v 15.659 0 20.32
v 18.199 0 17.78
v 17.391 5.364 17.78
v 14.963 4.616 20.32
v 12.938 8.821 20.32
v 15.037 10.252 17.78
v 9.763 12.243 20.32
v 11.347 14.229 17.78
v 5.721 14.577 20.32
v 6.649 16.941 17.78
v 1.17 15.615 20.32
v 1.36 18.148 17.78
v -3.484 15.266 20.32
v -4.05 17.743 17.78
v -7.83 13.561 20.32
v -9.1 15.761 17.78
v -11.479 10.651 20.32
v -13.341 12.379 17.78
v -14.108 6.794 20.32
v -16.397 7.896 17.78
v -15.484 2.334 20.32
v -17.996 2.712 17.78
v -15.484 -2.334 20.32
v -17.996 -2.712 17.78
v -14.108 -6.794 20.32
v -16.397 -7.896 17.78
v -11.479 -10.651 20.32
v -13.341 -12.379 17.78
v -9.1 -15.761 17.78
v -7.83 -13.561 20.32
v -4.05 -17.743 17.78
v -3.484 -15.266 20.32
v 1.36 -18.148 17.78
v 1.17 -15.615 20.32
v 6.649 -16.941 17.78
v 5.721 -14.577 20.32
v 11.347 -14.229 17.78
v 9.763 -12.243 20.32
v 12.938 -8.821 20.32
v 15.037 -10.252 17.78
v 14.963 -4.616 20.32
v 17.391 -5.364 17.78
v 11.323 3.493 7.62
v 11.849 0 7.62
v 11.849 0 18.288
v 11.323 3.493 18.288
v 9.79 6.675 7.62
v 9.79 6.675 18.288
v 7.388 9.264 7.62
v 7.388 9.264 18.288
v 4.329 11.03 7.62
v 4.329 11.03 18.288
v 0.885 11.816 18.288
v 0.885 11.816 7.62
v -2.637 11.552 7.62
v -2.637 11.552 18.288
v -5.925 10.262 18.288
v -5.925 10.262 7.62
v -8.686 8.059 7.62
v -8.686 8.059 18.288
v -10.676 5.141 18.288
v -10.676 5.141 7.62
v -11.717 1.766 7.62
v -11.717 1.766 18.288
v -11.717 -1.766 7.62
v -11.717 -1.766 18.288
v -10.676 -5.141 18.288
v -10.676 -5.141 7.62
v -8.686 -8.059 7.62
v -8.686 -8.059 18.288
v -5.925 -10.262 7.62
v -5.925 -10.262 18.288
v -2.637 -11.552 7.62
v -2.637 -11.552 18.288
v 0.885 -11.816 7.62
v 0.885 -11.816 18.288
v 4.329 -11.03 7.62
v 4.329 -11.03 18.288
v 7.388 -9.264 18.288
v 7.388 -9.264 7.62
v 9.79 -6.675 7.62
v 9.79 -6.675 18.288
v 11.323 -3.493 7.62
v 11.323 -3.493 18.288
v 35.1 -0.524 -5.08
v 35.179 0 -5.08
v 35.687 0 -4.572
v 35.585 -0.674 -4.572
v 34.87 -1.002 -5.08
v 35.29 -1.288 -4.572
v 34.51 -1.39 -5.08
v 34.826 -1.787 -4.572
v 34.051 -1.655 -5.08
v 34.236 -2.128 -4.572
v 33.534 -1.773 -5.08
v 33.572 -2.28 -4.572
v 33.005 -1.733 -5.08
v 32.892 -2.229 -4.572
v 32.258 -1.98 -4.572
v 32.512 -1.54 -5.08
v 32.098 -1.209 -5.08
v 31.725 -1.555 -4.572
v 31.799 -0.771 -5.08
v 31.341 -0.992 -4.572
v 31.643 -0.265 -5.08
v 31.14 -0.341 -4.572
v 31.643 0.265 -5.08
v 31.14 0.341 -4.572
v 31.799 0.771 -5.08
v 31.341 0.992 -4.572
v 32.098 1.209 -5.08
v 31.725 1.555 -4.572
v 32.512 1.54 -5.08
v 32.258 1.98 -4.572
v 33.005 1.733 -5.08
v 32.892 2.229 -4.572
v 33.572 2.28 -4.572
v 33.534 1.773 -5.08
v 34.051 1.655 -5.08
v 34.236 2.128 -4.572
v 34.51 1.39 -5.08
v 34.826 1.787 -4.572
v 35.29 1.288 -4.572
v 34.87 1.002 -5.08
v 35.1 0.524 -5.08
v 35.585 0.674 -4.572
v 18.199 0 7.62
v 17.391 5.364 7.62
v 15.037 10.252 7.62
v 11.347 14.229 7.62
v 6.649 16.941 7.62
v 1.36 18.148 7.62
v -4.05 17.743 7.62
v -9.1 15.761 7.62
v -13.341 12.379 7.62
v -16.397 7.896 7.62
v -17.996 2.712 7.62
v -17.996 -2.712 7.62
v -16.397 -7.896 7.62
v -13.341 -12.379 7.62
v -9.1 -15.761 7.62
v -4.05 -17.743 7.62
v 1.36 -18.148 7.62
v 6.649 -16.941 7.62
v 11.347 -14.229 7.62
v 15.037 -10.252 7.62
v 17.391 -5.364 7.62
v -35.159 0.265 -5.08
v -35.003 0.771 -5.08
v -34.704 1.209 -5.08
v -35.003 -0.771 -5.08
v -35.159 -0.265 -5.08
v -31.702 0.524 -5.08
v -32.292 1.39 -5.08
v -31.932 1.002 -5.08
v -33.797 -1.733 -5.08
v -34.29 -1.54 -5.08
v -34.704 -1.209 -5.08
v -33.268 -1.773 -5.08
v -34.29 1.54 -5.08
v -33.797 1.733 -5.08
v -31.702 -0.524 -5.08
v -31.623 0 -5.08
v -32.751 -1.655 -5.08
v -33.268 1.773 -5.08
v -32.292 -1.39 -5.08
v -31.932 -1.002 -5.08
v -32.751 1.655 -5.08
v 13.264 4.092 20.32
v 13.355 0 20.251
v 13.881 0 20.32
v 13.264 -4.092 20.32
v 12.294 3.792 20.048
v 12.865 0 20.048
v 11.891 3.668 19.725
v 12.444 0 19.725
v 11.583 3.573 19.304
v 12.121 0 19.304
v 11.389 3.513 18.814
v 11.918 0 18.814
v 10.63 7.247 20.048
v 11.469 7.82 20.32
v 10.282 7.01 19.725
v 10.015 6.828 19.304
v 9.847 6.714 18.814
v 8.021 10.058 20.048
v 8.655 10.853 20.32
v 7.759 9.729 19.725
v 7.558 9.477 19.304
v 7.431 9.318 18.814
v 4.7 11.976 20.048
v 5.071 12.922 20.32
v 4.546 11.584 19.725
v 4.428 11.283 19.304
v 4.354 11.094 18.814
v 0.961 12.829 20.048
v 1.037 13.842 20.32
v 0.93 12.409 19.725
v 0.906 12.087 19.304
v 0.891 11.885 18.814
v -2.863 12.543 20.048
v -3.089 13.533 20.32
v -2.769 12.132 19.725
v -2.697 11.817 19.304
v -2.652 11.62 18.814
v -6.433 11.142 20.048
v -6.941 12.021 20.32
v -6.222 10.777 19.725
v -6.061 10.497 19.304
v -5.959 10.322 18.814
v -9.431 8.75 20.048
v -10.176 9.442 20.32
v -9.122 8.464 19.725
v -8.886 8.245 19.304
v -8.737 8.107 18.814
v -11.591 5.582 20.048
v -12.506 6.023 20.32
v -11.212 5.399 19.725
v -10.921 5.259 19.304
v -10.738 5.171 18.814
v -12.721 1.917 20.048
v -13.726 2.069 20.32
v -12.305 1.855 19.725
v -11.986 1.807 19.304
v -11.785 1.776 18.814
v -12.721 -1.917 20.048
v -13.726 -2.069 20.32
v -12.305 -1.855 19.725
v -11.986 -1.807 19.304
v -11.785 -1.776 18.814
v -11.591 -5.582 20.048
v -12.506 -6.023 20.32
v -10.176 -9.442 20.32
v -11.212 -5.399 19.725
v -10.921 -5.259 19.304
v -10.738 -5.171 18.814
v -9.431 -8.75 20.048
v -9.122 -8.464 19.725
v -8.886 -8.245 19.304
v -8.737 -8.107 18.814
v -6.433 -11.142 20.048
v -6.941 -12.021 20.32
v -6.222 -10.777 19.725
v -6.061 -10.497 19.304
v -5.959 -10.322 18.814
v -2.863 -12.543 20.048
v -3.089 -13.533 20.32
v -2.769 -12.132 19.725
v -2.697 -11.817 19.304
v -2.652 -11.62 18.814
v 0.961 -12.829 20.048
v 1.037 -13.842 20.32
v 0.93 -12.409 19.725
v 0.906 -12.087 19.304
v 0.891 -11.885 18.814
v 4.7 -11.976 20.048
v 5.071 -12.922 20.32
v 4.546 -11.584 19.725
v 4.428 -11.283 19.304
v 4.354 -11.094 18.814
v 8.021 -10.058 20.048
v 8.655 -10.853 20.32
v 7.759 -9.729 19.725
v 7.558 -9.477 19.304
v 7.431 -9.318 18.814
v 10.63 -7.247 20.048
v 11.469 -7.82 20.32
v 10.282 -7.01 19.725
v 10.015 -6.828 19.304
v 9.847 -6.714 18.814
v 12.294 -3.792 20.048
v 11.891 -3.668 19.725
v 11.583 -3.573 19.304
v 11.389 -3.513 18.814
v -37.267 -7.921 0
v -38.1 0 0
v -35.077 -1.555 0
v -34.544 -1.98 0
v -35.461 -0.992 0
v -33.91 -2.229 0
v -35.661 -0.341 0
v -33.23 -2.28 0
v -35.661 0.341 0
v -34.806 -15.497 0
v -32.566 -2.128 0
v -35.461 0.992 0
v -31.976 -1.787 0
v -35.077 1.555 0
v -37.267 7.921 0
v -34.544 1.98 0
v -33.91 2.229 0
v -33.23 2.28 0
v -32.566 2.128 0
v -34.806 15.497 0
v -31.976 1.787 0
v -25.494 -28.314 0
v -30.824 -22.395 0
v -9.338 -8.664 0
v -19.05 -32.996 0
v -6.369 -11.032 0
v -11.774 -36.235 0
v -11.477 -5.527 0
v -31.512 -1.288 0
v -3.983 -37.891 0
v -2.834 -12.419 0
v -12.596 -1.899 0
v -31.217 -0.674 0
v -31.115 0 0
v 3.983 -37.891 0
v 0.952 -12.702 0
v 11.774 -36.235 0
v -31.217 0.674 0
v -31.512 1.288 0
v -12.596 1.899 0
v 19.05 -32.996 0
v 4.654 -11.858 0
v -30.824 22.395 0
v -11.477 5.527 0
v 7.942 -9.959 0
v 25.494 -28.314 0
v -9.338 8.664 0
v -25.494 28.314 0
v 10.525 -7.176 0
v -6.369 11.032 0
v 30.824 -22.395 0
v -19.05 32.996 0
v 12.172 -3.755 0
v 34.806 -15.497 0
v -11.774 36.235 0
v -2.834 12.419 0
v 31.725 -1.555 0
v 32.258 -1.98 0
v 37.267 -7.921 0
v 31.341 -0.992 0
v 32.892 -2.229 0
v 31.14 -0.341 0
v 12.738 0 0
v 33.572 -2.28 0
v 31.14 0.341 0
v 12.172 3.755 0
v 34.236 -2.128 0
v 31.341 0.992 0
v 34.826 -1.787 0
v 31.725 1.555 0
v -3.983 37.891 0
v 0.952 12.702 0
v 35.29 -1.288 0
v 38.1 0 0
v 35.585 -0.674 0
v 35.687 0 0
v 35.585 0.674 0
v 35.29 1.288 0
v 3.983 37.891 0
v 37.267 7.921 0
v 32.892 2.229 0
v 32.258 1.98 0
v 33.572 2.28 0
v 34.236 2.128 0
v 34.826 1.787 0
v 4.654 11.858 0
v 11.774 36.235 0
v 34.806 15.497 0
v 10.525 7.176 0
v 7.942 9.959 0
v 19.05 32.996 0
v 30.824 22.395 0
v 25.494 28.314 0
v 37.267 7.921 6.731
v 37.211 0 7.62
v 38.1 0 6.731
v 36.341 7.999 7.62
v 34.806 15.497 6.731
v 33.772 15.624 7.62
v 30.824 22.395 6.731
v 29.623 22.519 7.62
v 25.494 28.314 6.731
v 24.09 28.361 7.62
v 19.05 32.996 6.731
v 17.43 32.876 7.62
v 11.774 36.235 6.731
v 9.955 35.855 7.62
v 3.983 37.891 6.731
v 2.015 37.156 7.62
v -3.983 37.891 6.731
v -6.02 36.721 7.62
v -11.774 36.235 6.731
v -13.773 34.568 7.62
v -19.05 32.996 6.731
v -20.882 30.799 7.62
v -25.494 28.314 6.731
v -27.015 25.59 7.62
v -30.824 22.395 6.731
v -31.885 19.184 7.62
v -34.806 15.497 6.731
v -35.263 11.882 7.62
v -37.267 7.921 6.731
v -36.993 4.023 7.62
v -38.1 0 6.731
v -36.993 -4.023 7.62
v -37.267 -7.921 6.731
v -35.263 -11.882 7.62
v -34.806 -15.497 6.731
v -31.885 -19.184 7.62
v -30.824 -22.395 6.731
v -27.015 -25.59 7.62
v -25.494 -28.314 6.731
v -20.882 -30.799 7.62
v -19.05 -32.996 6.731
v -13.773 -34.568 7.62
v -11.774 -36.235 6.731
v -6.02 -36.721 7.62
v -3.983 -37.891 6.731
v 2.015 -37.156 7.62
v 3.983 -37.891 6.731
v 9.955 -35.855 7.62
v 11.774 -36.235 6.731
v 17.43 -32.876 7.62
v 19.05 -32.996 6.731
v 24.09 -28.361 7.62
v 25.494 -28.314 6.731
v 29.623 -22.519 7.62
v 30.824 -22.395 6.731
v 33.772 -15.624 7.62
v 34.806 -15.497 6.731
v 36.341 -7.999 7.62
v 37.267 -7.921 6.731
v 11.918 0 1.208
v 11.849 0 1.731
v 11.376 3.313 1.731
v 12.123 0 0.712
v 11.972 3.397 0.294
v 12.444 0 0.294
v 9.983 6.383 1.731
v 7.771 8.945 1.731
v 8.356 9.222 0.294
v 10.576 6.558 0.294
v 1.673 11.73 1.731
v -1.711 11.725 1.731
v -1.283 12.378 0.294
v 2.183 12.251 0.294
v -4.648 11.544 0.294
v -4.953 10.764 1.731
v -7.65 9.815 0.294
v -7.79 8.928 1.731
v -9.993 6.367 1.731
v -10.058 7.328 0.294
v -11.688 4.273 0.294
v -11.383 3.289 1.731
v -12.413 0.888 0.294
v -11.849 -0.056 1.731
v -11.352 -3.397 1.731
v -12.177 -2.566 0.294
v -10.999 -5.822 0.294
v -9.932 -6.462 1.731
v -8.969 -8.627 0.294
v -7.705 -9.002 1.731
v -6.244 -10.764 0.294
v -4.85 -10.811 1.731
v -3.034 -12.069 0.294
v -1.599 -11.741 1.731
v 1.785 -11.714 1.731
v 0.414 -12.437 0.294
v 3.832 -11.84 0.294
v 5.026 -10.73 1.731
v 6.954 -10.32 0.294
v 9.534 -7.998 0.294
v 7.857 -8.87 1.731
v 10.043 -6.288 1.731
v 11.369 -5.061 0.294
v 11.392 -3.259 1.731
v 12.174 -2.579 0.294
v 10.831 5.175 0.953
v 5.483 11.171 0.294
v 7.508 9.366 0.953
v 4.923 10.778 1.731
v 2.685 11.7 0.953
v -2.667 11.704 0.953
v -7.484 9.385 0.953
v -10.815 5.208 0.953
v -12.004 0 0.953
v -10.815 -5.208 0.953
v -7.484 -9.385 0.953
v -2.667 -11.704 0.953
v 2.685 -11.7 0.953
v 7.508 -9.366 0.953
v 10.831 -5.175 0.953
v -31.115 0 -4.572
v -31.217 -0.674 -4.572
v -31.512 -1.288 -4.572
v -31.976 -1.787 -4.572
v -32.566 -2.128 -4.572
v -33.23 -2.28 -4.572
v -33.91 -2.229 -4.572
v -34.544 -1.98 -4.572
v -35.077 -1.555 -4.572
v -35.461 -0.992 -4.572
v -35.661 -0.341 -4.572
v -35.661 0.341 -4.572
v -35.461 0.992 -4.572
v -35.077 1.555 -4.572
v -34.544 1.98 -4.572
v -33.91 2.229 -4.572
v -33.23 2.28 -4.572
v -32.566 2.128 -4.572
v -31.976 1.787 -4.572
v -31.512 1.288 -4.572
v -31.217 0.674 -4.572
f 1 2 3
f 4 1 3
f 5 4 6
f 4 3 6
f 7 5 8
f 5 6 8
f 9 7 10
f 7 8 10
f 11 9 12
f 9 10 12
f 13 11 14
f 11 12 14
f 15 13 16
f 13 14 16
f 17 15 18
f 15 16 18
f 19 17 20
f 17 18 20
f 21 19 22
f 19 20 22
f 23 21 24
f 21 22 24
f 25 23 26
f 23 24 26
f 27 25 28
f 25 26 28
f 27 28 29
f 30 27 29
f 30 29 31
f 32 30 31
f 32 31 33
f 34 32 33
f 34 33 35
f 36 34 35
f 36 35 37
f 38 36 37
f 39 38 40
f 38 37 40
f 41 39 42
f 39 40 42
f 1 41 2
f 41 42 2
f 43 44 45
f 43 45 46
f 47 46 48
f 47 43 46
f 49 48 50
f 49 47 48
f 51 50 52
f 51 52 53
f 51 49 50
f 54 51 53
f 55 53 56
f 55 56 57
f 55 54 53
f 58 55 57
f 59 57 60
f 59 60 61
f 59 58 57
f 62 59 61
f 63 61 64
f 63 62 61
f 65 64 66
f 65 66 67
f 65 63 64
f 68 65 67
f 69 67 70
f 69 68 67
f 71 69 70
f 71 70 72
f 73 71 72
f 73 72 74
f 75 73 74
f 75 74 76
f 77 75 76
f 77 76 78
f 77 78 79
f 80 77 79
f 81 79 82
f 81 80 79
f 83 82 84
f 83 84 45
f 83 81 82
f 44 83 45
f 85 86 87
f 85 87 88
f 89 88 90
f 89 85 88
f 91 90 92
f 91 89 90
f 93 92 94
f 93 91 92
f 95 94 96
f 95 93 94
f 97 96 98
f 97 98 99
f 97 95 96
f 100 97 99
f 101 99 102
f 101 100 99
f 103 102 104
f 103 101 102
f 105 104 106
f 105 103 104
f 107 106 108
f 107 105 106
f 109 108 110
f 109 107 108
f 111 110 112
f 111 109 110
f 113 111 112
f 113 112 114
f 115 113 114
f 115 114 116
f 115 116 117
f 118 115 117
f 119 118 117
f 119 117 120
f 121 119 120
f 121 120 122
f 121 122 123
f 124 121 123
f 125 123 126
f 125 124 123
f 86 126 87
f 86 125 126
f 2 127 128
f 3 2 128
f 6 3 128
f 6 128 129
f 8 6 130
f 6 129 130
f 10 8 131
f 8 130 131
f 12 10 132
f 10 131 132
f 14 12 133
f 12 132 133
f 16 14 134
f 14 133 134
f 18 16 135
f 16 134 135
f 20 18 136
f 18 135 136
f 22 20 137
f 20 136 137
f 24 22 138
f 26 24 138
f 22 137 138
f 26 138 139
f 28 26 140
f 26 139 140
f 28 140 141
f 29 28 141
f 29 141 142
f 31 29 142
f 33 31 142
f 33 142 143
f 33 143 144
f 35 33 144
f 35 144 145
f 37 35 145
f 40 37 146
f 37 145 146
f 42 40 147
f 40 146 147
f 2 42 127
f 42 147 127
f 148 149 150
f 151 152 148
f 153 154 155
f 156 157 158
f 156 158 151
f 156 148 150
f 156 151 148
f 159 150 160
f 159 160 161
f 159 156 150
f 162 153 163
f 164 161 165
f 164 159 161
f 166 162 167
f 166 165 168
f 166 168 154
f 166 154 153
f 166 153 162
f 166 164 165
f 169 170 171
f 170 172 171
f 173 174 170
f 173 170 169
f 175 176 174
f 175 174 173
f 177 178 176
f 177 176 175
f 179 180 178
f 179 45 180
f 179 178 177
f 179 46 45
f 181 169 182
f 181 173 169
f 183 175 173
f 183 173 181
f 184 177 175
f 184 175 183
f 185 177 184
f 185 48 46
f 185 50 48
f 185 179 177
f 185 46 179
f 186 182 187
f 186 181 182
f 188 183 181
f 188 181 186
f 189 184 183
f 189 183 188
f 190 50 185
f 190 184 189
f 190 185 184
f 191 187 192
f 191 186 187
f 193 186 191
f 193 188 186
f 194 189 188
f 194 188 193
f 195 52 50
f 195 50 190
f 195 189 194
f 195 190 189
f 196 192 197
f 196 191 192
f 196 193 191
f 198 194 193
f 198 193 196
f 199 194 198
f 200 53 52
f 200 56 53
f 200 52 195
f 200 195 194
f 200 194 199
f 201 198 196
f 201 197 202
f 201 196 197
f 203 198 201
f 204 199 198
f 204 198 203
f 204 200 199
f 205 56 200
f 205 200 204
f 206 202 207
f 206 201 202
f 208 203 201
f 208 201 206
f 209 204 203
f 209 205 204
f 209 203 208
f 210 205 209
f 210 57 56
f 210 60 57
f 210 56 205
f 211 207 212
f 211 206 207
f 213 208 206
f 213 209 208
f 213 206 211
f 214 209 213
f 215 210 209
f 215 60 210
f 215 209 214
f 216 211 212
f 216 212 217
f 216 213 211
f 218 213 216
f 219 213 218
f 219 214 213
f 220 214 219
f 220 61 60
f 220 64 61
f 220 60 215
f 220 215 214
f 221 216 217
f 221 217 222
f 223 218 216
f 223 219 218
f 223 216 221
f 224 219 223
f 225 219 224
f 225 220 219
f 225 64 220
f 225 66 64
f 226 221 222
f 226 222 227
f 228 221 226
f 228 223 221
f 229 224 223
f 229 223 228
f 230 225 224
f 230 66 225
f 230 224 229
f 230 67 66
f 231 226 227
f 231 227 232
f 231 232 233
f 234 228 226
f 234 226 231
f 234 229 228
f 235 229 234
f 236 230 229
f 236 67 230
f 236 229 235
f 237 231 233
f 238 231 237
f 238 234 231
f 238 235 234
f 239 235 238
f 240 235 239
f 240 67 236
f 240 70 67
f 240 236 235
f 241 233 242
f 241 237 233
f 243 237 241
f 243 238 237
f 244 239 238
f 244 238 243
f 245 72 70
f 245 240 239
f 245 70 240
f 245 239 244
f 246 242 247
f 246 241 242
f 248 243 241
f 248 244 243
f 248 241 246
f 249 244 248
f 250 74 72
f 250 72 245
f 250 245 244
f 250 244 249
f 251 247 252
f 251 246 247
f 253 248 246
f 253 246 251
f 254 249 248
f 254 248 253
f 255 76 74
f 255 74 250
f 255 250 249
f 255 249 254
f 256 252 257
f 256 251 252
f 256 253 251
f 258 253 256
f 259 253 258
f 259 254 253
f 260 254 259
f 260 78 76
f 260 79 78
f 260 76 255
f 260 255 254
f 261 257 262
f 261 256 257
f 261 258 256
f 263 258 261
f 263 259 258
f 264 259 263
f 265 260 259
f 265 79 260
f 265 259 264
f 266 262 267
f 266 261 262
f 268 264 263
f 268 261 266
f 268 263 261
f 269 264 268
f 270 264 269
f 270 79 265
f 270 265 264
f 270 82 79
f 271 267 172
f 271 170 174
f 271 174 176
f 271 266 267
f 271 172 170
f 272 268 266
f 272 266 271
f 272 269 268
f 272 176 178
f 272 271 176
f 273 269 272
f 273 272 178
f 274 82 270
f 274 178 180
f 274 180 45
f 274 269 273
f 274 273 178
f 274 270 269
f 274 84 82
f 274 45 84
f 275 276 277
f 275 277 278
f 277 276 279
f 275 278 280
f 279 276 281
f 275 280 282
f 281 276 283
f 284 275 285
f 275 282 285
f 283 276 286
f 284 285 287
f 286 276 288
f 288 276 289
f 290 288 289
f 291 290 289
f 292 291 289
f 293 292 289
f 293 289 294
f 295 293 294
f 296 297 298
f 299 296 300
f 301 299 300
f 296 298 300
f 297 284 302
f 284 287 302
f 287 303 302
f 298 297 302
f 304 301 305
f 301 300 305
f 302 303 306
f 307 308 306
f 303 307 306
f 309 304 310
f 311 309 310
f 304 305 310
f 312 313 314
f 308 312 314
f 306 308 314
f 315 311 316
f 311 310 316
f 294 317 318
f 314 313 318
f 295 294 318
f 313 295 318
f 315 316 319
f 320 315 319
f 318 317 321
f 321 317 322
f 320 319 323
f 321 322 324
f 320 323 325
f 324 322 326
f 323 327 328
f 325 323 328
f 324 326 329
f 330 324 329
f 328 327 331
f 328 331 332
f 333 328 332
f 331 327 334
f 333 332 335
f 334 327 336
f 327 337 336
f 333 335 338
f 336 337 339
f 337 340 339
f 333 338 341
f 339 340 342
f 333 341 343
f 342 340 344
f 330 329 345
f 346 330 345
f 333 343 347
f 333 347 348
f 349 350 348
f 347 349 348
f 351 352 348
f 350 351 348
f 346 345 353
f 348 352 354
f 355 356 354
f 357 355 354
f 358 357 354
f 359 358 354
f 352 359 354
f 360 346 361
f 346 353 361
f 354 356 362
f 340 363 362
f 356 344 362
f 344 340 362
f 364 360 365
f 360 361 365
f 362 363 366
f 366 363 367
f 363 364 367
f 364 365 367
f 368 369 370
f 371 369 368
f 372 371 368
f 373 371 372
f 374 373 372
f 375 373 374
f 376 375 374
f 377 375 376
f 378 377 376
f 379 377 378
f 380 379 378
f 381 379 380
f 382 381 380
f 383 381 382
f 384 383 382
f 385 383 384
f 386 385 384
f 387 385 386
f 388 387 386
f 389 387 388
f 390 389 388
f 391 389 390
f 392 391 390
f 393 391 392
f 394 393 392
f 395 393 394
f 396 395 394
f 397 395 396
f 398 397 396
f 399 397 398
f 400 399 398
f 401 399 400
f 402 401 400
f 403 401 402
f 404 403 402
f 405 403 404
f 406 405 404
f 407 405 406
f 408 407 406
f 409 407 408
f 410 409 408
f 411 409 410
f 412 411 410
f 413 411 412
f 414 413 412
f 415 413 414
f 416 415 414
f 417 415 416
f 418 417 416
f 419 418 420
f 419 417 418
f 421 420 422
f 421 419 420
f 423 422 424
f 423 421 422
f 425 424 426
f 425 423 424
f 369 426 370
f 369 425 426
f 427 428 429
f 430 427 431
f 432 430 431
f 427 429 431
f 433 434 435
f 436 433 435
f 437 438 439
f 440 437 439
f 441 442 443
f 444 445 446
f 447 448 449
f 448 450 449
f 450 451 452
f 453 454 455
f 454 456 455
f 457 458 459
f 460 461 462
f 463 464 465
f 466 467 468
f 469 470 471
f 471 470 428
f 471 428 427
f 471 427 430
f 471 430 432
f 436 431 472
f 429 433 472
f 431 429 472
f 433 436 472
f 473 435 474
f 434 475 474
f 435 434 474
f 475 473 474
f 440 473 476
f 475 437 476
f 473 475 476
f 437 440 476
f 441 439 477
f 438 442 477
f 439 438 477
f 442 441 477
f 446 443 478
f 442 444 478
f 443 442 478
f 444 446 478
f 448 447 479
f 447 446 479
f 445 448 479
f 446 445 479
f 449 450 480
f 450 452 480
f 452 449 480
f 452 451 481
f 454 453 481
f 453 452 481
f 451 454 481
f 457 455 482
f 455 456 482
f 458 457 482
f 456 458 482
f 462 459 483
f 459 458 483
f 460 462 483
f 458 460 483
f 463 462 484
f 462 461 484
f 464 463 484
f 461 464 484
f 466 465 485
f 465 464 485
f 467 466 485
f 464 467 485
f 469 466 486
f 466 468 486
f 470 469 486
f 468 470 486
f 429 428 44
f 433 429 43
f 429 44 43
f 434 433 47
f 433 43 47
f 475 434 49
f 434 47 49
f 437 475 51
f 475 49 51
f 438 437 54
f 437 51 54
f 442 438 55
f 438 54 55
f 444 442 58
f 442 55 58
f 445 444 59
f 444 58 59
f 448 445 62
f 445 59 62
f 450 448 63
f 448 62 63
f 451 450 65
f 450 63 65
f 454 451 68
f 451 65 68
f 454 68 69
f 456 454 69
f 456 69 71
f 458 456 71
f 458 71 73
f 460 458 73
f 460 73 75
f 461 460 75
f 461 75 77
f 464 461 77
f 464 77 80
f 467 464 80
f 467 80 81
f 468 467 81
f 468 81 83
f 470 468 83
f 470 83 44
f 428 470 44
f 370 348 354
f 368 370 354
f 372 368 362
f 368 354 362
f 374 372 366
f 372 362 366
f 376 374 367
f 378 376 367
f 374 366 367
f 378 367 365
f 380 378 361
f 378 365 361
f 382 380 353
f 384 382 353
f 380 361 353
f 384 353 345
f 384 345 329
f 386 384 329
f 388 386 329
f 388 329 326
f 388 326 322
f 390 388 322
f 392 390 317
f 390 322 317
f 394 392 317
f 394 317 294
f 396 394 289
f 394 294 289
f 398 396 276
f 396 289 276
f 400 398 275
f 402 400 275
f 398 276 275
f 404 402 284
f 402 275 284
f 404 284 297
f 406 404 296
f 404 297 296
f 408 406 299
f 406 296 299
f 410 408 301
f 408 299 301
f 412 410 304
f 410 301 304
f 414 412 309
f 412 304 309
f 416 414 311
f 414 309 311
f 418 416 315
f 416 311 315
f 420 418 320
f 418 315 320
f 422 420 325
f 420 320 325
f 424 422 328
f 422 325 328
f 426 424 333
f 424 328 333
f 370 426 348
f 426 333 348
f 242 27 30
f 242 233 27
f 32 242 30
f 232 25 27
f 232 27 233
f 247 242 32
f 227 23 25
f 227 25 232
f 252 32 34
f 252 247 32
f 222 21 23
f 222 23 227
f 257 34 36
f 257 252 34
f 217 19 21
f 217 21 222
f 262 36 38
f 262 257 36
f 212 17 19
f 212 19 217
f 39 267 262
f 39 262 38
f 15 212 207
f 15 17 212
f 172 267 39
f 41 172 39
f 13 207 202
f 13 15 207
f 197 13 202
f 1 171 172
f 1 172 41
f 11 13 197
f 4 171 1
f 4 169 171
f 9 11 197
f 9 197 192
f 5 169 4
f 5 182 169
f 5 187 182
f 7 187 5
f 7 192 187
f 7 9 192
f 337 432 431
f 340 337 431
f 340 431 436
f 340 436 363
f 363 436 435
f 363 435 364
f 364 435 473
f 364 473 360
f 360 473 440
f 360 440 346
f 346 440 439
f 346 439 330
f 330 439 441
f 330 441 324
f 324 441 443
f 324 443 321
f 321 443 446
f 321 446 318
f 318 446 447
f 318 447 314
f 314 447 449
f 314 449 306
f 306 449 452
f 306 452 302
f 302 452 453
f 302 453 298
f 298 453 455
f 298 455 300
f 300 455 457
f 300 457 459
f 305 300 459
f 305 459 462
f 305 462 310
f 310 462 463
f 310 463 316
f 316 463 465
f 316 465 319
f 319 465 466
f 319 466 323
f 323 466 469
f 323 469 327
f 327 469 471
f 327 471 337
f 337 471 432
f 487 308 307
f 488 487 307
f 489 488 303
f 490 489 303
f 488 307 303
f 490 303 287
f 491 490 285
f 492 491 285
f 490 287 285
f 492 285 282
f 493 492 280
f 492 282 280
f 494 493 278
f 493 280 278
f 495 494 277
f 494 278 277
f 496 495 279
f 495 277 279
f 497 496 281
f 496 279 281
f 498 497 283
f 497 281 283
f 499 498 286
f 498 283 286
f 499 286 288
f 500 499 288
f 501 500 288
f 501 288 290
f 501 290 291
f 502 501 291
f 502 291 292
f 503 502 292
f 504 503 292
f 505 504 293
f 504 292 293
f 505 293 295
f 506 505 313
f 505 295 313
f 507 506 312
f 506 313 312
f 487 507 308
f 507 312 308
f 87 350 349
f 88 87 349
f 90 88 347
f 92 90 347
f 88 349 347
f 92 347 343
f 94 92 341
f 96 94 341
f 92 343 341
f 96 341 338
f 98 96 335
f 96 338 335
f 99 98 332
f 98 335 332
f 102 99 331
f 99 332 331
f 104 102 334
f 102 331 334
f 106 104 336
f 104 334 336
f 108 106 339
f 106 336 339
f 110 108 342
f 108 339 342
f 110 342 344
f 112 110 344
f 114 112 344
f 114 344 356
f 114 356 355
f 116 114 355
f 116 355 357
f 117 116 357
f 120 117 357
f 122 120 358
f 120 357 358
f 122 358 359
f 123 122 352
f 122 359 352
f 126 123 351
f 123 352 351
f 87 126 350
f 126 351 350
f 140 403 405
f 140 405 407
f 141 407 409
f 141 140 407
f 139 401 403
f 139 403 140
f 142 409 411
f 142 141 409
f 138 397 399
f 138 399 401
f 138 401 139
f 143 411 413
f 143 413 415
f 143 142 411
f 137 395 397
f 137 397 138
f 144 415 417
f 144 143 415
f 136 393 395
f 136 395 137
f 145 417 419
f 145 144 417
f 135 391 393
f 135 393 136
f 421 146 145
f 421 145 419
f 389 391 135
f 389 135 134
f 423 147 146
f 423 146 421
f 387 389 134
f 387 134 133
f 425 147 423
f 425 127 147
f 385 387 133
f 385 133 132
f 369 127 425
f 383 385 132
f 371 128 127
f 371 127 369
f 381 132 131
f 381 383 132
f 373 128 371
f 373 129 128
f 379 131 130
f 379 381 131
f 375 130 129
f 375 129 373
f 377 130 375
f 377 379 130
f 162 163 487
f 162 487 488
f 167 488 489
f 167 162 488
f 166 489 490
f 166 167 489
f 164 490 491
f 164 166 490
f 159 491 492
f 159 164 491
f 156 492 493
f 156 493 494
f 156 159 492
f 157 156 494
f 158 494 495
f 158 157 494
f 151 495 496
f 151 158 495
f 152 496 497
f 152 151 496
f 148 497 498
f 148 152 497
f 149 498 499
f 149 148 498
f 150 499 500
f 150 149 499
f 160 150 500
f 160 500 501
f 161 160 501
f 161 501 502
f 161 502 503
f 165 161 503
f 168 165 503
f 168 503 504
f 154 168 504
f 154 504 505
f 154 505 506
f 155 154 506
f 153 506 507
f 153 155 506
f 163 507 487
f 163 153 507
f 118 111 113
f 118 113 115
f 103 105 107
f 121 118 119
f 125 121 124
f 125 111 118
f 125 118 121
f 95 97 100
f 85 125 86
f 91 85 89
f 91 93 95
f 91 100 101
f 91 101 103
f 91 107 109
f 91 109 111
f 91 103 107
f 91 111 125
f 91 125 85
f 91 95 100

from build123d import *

# Parameters (mm, degrees)
F0_R     = 38.1
F1_DEPTH = 7.62
F2_R     = 11.8491
F3_DEPTH = 7.621
F4_SIZE  = 0.889
F5_R     = 2.286
F6_DEPTH = 5.08
F7_SIZE  = 0.508
F8_R     = 18.1991
F8_R_2   = 11.8491
F9_DEPTH = 12.7
F10_R    = 2.032
F11_SIZE = 2.54


with BuildPart() as f1:
    # F0 (on Top) → F1 (new body)
    with BuildSketch(Plane.XY):
        Circle(F0_R)
    extrude(amount=F1_DEPTH)

    # F2 (on face) → F3 (cut, through all)
    with BuildSketch(Plane.XY.offset(7.62)):
        Circle(F2_R)
    extrude(amount=-F3_DEPTH, mode=Mode.SUBTRACT)

    # F4
    f4_edges = [f1.edges().sort_by_distance(p)[0] for p in [
        (-38.1, 0, 7.62),
        (-11.8491, 0, 0),
    ]]
    chamfer(f4_edges, length=F4_SIZE)

    # F5 (on face) → F6 (join)
    with BuildSketch(Plane(origin=(0, 0, 0), x_dir=(1, 0, 0), z_dir=(0, 0, -1))):
        with Locations((-33.4009492, 0)):
            Circle(F5_R)
        with Locations((33.4009492, 0)):
            Circle(F5_R)
    extrude(amount=F6_DEPTH)

    # F7
    f7_edges = [f1.edges().sort_by_distance(p)[0] for p in [
        (31.114949, 0, -5.08),
        (-35.686949, 0, -5.08),
    ]]
    chamfer(f7_edges, length=F7_SIZE)

    # F8 (on face) → F9 (join)
    with BuildSketch(Plane.XY.offset(7.62)):
        Circle(F8_R)
        Circle(F8_R_2, mode=Mode.SUBTRACT)
    extrude(amount=F9_DEPTH)

    # F10
    f10_edges = [f1.edges().sort_by_distance(p)[0] for p in [
        (-11.8491, 0, 7.62),
        (11.8491, 0, 4.2545),
        (-11.8491, 0, 0.889),
        (11.8491, 0, 13.97),
        (-11.8491, 0, 20.32),
    ]]
    fillet(f10_edges, radius=F10_R)

    # F11
    f11_edges = [f1.edges().sort_by_distance(p)[0] for p in [
        (-18.1991, 0, 20.32),
    ]]
    chamfer(f11_edges, length=F11_SIZE)


solid = f1.part
